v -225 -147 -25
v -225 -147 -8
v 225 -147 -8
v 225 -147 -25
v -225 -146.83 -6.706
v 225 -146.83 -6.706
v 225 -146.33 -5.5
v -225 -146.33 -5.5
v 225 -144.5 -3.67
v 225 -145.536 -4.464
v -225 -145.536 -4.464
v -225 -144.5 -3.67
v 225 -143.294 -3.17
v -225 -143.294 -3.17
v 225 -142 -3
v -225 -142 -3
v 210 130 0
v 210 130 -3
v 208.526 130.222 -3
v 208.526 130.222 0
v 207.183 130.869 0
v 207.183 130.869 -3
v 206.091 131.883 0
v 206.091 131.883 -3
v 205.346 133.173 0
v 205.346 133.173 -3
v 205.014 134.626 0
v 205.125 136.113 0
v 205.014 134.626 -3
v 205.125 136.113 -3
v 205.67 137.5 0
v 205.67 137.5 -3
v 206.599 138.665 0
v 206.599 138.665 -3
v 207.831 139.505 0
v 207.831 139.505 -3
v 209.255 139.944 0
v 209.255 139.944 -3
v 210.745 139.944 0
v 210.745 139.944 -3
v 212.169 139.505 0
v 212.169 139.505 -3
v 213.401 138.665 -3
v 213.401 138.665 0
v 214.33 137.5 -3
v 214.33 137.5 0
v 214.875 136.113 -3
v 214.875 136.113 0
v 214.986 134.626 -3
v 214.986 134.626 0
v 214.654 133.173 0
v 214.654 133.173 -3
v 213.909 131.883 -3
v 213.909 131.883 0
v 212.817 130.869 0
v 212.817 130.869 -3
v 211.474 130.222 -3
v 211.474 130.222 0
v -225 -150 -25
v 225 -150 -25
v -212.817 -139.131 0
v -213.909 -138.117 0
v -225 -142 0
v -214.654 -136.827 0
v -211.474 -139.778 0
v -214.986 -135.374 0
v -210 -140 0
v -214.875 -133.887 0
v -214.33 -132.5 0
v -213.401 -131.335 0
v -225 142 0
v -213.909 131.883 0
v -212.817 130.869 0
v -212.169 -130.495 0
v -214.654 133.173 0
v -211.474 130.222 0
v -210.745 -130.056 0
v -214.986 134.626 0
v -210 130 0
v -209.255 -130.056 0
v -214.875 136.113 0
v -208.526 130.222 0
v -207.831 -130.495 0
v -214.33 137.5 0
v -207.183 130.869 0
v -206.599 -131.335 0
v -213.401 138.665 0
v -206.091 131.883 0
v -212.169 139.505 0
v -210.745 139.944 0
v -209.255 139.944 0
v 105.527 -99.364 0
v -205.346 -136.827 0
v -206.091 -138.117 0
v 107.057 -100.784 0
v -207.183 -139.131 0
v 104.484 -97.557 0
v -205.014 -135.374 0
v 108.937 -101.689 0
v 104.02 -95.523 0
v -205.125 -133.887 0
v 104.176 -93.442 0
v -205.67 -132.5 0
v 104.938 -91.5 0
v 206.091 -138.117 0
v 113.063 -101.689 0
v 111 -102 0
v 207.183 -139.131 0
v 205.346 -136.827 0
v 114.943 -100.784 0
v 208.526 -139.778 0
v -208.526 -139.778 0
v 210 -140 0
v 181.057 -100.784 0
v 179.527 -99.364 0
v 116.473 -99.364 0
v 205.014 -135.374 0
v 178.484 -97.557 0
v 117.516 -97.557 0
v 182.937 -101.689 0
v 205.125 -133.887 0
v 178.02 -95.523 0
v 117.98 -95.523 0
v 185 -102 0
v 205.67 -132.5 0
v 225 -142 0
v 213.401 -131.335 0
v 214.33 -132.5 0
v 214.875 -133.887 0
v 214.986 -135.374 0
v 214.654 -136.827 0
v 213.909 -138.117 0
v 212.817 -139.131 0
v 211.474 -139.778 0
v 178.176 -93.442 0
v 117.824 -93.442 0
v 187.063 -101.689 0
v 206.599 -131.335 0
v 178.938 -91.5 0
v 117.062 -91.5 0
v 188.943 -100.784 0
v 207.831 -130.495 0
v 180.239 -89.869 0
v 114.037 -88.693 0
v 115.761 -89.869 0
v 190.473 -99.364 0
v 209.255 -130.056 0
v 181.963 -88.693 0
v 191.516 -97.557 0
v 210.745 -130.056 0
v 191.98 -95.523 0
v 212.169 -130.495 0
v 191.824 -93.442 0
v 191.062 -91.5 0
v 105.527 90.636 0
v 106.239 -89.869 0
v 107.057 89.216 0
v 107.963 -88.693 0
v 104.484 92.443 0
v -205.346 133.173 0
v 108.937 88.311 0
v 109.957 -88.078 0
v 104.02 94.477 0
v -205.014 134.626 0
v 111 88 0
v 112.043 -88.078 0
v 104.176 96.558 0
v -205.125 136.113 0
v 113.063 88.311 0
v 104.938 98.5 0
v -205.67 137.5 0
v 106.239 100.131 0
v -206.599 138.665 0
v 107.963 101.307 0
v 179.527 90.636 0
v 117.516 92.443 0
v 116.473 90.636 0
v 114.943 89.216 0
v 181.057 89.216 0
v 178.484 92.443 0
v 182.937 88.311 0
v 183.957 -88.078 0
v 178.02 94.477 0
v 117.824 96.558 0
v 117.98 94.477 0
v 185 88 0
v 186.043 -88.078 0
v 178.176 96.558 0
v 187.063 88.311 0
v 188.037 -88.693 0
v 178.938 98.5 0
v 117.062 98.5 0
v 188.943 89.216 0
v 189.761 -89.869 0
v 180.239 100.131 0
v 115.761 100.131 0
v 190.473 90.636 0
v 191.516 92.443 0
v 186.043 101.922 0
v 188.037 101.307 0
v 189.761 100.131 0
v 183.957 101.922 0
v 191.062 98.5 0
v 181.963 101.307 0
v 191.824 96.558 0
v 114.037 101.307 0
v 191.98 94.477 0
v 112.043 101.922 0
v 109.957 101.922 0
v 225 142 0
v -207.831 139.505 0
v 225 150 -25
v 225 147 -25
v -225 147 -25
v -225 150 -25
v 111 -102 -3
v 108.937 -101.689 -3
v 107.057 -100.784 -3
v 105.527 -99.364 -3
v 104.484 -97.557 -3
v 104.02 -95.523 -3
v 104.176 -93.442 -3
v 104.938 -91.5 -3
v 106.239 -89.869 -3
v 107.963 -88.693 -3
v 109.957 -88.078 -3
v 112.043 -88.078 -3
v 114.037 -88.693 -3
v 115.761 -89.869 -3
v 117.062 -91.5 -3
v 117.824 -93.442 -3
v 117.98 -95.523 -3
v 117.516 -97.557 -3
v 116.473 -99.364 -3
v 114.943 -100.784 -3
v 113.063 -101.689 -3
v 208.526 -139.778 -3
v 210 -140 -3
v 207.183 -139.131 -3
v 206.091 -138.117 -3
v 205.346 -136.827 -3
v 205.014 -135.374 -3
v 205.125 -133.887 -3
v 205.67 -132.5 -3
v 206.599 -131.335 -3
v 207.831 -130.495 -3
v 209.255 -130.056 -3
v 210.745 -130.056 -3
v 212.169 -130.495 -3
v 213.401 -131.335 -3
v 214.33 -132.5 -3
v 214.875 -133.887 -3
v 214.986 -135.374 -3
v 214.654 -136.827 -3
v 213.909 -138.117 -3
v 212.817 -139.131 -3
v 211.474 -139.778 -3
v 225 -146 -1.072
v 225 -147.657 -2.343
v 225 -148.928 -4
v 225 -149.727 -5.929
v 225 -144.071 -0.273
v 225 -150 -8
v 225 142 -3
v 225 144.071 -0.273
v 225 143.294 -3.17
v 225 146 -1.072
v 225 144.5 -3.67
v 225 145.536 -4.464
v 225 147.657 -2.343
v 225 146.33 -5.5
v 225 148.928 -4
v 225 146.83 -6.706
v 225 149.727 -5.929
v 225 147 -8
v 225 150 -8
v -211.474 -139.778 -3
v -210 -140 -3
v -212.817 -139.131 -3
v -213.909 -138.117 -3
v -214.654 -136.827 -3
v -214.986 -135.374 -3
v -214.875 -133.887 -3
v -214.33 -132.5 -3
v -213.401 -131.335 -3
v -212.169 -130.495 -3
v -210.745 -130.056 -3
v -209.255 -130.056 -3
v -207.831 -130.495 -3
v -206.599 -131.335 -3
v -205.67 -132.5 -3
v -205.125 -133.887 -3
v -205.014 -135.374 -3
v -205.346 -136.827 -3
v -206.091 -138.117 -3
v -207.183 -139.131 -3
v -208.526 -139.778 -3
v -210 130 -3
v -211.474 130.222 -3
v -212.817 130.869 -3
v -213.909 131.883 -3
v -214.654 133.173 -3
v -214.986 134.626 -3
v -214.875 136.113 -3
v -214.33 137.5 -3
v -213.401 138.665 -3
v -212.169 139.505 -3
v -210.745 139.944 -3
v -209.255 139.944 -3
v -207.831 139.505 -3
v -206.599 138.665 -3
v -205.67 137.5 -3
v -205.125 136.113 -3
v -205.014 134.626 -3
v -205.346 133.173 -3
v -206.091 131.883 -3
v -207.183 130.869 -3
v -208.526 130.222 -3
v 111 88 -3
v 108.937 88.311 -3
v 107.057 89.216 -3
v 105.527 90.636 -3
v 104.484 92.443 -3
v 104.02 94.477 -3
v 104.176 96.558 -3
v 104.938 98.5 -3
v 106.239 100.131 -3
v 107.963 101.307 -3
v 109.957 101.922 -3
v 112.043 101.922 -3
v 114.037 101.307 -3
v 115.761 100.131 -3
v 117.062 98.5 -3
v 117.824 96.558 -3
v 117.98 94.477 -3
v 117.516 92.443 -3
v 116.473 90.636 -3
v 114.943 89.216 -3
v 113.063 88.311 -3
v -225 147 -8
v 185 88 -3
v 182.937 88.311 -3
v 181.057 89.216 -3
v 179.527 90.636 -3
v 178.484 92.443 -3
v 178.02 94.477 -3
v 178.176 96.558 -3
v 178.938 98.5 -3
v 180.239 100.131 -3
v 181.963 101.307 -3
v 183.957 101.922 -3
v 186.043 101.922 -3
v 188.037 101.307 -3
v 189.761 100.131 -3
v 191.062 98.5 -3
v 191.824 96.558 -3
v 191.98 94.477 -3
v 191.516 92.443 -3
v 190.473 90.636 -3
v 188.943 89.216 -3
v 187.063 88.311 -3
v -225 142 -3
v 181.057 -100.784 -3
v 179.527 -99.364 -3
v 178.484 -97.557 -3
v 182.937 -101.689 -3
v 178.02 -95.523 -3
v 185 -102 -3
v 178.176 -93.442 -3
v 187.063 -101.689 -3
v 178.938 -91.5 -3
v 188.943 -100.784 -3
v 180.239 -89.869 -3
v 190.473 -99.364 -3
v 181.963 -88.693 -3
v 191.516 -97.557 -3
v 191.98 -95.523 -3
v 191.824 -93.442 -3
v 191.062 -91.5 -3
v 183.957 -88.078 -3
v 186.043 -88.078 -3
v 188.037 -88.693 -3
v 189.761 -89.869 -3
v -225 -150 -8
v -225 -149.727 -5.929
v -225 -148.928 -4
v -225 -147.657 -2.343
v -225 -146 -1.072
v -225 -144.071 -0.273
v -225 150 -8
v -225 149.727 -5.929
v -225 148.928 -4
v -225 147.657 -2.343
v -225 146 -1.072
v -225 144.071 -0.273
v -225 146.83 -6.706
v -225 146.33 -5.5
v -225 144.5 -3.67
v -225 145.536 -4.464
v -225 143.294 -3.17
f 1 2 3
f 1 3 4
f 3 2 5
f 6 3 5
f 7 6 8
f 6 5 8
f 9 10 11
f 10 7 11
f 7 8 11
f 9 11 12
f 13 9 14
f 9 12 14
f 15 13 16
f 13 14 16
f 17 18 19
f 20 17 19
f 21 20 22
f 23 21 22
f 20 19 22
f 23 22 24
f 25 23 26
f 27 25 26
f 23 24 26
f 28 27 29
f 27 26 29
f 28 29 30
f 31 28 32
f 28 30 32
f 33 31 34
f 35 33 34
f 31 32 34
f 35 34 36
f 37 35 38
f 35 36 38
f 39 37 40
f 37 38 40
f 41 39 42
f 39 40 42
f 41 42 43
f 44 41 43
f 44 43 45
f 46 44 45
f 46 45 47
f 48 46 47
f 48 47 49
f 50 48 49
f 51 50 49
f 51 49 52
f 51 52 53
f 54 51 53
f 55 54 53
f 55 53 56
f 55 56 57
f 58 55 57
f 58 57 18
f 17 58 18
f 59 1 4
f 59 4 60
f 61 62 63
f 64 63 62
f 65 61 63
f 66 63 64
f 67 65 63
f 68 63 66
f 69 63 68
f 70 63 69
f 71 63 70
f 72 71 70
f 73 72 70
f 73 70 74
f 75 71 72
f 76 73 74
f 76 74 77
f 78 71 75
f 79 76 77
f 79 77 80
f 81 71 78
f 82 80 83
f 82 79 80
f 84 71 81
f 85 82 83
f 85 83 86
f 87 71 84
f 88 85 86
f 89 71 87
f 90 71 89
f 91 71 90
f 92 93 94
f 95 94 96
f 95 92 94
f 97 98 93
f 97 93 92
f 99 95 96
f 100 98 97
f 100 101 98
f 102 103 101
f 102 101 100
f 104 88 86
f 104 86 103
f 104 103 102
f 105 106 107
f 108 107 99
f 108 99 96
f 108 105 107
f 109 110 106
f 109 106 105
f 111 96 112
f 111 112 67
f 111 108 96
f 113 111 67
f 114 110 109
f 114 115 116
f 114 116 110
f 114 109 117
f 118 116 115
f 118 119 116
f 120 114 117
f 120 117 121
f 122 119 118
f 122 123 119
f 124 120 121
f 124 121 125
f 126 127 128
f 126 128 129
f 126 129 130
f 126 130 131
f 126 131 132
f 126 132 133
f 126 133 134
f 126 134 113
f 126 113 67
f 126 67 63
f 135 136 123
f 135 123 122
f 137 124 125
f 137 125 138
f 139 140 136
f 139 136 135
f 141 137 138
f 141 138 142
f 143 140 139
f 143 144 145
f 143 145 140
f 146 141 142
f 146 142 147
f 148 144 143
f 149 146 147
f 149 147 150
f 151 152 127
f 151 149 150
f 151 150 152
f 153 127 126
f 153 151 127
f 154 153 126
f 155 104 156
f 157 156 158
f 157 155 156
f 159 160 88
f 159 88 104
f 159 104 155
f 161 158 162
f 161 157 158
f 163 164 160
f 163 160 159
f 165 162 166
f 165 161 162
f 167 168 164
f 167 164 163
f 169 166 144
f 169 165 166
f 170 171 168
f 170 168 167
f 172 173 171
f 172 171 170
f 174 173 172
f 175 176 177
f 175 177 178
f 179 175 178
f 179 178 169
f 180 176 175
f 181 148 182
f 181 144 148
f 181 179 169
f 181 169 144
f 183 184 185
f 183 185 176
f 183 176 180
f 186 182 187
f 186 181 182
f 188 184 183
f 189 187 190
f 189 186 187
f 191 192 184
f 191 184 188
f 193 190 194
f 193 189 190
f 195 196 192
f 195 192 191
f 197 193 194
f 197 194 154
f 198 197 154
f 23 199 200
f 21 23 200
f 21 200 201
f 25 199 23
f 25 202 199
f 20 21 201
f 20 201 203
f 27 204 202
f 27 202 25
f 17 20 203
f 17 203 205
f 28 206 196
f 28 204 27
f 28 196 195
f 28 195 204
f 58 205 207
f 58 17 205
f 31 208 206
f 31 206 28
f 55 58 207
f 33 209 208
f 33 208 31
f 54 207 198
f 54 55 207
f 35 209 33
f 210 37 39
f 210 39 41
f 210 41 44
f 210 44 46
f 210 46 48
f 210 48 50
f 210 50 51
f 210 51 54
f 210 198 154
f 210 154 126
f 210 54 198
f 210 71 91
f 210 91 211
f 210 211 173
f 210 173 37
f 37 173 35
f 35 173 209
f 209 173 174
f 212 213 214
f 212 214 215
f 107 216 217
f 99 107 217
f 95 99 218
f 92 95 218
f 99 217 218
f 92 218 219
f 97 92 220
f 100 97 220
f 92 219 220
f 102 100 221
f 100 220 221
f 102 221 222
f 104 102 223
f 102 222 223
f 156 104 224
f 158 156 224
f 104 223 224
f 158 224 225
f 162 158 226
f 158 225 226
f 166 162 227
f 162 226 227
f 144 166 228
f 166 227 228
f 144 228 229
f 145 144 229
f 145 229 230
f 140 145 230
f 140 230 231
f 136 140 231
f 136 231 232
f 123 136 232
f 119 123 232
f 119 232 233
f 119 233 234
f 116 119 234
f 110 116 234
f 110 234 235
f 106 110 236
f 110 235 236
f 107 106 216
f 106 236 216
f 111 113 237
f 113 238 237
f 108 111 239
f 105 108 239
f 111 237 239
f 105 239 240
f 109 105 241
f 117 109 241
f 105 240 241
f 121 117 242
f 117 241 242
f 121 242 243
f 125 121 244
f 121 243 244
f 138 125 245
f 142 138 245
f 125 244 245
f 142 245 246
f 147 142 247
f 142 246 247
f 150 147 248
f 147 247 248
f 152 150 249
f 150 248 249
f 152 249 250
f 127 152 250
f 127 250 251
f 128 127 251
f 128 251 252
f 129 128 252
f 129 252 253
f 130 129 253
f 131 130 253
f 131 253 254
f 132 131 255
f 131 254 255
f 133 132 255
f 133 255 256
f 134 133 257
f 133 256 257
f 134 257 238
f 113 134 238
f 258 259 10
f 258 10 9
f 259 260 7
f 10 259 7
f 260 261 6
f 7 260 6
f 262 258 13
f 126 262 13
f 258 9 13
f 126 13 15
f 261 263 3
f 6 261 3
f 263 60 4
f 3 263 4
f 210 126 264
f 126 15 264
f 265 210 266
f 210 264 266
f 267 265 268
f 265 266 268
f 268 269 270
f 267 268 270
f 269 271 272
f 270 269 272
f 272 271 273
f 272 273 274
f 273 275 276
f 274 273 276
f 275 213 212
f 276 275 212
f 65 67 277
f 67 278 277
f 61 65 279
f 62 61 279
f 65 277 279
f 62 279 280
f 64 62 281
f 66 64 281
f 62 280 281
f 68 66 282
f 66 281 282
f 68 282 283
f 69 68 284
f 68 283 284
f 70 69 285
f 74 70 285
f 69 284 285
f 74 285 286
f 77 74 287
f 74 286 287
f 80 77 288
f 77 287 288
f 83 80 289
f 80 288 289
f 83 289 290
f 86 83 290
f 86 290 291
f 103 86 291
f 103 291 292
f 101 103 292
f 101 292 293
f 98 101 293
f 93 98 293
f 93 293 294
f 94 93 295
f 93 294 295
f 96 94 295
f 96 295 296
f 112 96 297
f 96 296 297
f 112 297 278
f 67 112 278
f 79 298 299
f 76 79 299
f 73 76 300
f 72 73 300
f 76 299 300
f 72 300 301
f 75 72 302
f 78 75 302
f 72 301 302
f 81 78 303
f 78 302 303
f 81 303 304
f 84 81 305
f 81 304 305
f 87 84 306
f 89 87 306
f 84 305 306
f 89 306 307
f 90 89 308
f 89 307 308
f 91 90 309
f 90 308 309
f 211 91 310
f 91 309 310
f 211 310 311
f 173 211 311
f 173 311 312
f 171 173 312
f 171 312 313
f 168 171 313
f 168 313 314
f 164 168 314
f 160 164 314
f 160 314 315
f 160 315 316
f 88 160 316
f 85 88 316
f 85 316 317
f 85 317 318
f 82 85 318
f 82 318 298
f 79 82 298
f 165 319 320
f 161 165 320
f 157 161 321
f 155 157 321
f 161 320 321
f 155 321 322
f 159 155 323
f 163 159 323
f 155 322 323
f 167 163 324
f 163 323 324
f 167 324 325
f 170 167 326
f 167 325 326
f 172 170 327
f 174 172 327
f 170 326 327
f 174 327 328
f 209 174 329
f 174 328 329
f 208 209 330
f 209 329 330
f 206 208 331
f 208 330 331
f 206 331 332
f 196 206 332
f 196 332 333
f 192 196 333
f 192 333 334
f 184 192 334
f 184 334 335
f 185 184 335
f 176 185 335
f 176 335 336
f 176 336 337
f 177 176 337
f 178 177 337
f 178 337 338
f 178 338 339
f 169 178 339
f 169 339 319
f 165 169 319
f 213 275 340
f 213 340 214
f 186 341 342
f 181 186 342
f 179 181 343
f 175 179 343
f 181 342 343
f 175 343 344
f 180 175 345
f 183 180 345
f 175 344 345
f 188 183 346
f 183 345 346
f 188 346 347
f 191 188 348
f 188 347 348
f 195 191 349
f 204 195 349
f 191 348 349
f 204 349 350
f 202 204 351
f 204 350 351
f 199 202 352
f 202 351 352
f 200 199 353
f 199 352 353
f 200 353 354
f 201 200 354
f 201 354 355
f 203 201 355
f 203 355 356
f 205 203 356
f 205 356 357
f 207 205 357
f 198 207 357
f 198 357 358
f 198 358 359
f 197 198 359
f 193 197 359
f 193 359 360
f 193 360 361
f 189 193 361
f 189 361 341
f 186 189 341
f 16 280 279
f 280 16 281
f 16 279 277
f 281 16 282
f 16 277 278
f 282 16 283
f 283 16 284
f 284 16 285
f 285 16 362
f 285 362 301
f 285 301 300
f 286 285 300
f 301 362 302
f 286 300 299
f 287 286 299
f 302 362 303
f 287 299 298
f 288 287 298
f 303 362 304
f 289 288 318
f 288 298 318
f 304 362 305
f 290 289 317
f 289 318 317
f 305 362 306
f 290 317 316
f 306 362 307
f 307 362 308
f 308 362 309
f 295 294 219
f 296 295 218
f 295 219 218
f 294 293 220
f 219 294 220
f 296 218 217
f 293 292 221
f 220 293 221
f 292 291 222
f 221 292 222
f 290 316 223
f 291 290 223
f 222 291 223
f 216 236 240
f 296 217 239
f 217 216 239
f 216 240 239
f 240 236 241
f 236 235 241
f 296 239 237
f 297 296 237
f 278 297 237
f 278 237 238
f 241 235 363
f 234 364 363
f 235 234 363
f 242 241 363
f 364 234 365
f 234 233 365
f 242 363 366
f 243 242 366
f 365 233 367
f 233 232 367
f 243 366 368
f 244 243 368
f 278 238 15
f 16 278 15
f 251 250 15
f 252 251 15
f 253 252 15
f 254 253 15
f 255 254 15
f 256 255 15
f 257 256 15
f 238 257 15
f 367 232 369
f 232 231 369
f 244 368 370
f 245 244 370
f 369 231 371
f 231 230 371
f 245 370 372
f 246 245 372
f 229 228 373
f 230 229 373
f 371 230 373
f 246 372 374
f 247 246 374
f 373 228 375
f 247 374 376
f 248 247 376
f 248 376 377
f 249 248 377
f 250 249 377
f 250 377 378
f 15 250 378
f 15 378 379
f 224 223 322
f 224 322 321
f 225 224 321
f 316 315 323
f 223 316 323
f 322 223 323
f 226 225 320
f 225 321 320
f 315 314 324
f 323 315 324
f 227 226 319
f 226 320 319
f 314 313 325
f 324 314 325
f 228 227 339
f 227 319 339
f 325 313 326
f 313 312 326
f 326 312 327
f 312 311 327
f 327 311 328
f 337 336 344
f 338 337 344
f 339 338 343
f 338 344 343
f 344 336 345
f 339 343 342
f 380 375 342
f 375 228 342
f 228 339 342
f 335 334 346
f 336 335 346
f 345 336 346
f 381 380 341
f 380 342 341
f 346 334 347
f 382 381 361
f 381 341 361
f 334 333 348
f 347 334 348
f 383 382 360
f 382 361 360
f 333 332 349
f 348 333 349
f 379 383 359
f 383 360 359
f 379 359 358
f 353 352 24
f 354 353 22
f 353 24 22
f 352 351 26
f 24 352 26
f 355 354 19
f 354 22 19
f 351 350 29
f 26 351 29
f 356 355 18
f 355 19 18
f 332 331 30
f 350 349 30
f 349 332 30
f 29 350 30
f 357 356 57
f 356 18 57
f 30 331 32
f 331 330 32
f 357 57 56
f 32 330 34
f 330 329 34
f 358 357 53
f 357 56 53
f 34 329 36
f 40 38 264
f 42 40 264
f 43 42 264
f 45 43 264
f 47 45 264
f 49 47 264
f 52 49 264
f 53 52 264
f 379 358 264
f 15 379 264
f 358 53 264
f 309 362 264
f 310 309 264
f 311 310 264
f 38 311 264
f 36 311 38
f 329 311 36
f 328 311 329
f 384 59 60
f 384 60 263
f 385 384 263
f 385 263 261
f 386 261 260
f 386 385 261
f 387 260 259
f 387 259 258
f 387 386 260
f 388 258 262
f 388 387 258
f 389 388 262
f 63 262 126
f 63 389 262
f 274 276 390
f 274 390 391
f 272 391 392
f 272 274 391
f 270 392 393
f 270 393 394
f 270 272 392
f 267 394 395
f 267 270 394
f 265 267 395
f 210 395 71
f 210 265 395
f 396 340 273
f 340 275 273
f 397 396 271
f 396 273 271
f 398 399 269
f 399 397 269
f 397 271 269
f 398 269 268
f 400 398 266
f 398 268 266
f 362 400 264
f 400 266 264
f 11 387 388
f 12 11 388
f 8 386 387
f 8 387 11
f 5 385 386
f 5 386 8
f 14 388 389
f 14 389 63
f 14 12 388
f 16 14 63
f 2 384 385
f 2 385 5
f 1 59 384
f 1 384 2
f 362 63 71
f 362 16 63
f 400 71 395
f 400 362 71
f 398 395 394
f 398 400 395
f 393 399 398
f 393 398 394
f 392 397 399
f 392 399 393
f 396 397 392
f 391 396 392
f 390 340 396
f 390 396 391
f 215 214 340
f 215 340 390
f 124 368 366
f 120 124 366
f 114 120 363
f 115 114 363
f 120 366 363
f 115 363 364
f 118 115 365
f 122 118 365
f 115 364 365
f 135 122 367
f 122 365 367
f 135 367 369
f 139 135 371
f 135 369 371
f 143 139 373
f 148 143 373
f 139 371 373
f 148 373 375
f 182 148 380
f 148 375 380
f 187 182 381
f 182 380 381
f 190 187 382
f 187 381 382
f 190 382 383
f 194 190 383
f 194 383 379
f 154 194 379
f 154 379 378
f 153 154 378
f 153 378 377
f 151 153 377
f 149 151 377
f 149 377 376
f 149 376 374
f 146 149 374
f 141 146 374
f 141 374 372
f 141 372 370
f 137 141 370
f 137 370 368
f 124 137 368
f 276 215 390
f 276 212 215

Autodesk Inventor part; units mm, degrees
ref_plane "YZ Plane" through (0, 0, 0) normal (1, 0, 0) x (0, 1, 0)
ref_plane "XZ Plane" through (0, 0, 0) normal (0, 1, 0) x (-1, 0, 0)
ref_plane "XY Plane" through (0, 0, 0) normal (0, 0, 1) x (1, 0, 0)
sketch "Sketch1" plane through (0, 0, 0) normal (0, 0, 1) x (1, 0, 0)
  line L0 (-225, 150) -> (225, 150)
  line L1 (225, 150) -> (225, -150)
  line L2 (225, -150) -> (-225, -150)
  line L3 (-225, -150) -> (-225, 150)
  line L4 (-225, 150) -> (225, -150) construction
  point P0 (0, 0)
  point P1 (0, 0)
  dimension "d0" = 450
  dimension "d1" = 300
extrude "Plate1" add sketch "Sketch1" against normal blind 3
sketch "Sketch2" plane through (0, 0, 0) normal (0, 0, 1) x (1, 0, 0)
  line L0 (111, 95) -> (185, 95) construction
  line L1 (185, 95) -> (185, -95) construction
  line L2 (185, -95) -> (111, -95) construction
  line L3 (111, -95) -> (111, 95) construction
  line L4 (225, -150) -> (225, 150) projected
  point P0 (0, 0)
  point P1 (111, 0)
  dimension "d3" = 74
  dimension "d4" = 190
  dimension "d5" = 40
hole "Hole1" at (111, 95, 0) at (185, 95, 0) at (111, -95, 0) at (185, -95, 0) direction (0, 0, -1) diameter 14 end through all
sketch "Sketch3" plane through (0, 0, 0) normal (0, 0, 1) x (1, 0, 0)
  line L0 (-210, 135) -> (210, 135) construction
  line L1 (210, 135) -> (210, -135) construction
  line L2 (210, -135) -> (-210, -135) construction
  line L3 (-210, -135) -> (-210, 135) construction
  line L4 (-210, 135) -> (210, -135) construction
  point P0 (0, 0)
  point P1 (0, 0)
  dimension "d14" = 270
  dimension "d15" = 420
hole "Hole2" at (-210, 135, 0) at (210, 135, 0) at (210, -135, 0) at (-210, -135, 0) direction (0, 0, -1) diameter 10 end through all
sketch "Sketch4" plane through (-225, -147, 0) normal (0, -1, 0) x (1, 0, 0)
  line L0 (450, 0) -> (0, 0)
  line L1 (0, 0) -> (0, -25)
  line L2 (0, -25) -> (450, -25)
  line L3 (450, -25) -> (450, 0)
edge flange "Flange1" height 25 angle 90 thickness 3 bend radius 5 thickness toward (0, -1, 0) relief round relief width 3 relief depth 1.5 corner gap 5 corner form 0 edges at (0, -150, -3) (0, 150, -3) wall of the first edge with corners at (225, -147, 0) (-225, -147, 0) (-225, -147, -25) (225, -147, -25)
bend "Bend1"
corner "Corner1"
equation "\"d11\" = Thickness"
equation "\"d2\" = Thickness"
equation "\"d23\" = BendReliefWidth"
equation "\"d24\" = BendReliefDepth"
equation "\"d25\" = MinimumRemnant"
equation "\"d26\" = TransitionRadius"
equation "\"d29\" = BendRadius"
equation "\"d30\" = CornerReliefSize"
equation "\"d31\" = GapSize"
equation "\"d32\" = JacobiRadiusSize"
equation "\"BendReliefWidth\" = Thickness"
equation "\"BendReliefDepth\" = 0.5 * Thickness"
equation "\"CornerReliefSize\" = 4 * Thickness"
equation "\"MinimumRemnant\" = 2 * Thickness"
equation "\"TransitionRadius\" = BendRadius"
equation "\"JacobiRadiusSize\" = BendRadius"
equation "\"GapSize\" = Thickness"
equation "\"Thickness\" = 3"
equation "\"BendRadius\" = 5"
properties part number "Purity pump plate" material "Stainless Steel"
